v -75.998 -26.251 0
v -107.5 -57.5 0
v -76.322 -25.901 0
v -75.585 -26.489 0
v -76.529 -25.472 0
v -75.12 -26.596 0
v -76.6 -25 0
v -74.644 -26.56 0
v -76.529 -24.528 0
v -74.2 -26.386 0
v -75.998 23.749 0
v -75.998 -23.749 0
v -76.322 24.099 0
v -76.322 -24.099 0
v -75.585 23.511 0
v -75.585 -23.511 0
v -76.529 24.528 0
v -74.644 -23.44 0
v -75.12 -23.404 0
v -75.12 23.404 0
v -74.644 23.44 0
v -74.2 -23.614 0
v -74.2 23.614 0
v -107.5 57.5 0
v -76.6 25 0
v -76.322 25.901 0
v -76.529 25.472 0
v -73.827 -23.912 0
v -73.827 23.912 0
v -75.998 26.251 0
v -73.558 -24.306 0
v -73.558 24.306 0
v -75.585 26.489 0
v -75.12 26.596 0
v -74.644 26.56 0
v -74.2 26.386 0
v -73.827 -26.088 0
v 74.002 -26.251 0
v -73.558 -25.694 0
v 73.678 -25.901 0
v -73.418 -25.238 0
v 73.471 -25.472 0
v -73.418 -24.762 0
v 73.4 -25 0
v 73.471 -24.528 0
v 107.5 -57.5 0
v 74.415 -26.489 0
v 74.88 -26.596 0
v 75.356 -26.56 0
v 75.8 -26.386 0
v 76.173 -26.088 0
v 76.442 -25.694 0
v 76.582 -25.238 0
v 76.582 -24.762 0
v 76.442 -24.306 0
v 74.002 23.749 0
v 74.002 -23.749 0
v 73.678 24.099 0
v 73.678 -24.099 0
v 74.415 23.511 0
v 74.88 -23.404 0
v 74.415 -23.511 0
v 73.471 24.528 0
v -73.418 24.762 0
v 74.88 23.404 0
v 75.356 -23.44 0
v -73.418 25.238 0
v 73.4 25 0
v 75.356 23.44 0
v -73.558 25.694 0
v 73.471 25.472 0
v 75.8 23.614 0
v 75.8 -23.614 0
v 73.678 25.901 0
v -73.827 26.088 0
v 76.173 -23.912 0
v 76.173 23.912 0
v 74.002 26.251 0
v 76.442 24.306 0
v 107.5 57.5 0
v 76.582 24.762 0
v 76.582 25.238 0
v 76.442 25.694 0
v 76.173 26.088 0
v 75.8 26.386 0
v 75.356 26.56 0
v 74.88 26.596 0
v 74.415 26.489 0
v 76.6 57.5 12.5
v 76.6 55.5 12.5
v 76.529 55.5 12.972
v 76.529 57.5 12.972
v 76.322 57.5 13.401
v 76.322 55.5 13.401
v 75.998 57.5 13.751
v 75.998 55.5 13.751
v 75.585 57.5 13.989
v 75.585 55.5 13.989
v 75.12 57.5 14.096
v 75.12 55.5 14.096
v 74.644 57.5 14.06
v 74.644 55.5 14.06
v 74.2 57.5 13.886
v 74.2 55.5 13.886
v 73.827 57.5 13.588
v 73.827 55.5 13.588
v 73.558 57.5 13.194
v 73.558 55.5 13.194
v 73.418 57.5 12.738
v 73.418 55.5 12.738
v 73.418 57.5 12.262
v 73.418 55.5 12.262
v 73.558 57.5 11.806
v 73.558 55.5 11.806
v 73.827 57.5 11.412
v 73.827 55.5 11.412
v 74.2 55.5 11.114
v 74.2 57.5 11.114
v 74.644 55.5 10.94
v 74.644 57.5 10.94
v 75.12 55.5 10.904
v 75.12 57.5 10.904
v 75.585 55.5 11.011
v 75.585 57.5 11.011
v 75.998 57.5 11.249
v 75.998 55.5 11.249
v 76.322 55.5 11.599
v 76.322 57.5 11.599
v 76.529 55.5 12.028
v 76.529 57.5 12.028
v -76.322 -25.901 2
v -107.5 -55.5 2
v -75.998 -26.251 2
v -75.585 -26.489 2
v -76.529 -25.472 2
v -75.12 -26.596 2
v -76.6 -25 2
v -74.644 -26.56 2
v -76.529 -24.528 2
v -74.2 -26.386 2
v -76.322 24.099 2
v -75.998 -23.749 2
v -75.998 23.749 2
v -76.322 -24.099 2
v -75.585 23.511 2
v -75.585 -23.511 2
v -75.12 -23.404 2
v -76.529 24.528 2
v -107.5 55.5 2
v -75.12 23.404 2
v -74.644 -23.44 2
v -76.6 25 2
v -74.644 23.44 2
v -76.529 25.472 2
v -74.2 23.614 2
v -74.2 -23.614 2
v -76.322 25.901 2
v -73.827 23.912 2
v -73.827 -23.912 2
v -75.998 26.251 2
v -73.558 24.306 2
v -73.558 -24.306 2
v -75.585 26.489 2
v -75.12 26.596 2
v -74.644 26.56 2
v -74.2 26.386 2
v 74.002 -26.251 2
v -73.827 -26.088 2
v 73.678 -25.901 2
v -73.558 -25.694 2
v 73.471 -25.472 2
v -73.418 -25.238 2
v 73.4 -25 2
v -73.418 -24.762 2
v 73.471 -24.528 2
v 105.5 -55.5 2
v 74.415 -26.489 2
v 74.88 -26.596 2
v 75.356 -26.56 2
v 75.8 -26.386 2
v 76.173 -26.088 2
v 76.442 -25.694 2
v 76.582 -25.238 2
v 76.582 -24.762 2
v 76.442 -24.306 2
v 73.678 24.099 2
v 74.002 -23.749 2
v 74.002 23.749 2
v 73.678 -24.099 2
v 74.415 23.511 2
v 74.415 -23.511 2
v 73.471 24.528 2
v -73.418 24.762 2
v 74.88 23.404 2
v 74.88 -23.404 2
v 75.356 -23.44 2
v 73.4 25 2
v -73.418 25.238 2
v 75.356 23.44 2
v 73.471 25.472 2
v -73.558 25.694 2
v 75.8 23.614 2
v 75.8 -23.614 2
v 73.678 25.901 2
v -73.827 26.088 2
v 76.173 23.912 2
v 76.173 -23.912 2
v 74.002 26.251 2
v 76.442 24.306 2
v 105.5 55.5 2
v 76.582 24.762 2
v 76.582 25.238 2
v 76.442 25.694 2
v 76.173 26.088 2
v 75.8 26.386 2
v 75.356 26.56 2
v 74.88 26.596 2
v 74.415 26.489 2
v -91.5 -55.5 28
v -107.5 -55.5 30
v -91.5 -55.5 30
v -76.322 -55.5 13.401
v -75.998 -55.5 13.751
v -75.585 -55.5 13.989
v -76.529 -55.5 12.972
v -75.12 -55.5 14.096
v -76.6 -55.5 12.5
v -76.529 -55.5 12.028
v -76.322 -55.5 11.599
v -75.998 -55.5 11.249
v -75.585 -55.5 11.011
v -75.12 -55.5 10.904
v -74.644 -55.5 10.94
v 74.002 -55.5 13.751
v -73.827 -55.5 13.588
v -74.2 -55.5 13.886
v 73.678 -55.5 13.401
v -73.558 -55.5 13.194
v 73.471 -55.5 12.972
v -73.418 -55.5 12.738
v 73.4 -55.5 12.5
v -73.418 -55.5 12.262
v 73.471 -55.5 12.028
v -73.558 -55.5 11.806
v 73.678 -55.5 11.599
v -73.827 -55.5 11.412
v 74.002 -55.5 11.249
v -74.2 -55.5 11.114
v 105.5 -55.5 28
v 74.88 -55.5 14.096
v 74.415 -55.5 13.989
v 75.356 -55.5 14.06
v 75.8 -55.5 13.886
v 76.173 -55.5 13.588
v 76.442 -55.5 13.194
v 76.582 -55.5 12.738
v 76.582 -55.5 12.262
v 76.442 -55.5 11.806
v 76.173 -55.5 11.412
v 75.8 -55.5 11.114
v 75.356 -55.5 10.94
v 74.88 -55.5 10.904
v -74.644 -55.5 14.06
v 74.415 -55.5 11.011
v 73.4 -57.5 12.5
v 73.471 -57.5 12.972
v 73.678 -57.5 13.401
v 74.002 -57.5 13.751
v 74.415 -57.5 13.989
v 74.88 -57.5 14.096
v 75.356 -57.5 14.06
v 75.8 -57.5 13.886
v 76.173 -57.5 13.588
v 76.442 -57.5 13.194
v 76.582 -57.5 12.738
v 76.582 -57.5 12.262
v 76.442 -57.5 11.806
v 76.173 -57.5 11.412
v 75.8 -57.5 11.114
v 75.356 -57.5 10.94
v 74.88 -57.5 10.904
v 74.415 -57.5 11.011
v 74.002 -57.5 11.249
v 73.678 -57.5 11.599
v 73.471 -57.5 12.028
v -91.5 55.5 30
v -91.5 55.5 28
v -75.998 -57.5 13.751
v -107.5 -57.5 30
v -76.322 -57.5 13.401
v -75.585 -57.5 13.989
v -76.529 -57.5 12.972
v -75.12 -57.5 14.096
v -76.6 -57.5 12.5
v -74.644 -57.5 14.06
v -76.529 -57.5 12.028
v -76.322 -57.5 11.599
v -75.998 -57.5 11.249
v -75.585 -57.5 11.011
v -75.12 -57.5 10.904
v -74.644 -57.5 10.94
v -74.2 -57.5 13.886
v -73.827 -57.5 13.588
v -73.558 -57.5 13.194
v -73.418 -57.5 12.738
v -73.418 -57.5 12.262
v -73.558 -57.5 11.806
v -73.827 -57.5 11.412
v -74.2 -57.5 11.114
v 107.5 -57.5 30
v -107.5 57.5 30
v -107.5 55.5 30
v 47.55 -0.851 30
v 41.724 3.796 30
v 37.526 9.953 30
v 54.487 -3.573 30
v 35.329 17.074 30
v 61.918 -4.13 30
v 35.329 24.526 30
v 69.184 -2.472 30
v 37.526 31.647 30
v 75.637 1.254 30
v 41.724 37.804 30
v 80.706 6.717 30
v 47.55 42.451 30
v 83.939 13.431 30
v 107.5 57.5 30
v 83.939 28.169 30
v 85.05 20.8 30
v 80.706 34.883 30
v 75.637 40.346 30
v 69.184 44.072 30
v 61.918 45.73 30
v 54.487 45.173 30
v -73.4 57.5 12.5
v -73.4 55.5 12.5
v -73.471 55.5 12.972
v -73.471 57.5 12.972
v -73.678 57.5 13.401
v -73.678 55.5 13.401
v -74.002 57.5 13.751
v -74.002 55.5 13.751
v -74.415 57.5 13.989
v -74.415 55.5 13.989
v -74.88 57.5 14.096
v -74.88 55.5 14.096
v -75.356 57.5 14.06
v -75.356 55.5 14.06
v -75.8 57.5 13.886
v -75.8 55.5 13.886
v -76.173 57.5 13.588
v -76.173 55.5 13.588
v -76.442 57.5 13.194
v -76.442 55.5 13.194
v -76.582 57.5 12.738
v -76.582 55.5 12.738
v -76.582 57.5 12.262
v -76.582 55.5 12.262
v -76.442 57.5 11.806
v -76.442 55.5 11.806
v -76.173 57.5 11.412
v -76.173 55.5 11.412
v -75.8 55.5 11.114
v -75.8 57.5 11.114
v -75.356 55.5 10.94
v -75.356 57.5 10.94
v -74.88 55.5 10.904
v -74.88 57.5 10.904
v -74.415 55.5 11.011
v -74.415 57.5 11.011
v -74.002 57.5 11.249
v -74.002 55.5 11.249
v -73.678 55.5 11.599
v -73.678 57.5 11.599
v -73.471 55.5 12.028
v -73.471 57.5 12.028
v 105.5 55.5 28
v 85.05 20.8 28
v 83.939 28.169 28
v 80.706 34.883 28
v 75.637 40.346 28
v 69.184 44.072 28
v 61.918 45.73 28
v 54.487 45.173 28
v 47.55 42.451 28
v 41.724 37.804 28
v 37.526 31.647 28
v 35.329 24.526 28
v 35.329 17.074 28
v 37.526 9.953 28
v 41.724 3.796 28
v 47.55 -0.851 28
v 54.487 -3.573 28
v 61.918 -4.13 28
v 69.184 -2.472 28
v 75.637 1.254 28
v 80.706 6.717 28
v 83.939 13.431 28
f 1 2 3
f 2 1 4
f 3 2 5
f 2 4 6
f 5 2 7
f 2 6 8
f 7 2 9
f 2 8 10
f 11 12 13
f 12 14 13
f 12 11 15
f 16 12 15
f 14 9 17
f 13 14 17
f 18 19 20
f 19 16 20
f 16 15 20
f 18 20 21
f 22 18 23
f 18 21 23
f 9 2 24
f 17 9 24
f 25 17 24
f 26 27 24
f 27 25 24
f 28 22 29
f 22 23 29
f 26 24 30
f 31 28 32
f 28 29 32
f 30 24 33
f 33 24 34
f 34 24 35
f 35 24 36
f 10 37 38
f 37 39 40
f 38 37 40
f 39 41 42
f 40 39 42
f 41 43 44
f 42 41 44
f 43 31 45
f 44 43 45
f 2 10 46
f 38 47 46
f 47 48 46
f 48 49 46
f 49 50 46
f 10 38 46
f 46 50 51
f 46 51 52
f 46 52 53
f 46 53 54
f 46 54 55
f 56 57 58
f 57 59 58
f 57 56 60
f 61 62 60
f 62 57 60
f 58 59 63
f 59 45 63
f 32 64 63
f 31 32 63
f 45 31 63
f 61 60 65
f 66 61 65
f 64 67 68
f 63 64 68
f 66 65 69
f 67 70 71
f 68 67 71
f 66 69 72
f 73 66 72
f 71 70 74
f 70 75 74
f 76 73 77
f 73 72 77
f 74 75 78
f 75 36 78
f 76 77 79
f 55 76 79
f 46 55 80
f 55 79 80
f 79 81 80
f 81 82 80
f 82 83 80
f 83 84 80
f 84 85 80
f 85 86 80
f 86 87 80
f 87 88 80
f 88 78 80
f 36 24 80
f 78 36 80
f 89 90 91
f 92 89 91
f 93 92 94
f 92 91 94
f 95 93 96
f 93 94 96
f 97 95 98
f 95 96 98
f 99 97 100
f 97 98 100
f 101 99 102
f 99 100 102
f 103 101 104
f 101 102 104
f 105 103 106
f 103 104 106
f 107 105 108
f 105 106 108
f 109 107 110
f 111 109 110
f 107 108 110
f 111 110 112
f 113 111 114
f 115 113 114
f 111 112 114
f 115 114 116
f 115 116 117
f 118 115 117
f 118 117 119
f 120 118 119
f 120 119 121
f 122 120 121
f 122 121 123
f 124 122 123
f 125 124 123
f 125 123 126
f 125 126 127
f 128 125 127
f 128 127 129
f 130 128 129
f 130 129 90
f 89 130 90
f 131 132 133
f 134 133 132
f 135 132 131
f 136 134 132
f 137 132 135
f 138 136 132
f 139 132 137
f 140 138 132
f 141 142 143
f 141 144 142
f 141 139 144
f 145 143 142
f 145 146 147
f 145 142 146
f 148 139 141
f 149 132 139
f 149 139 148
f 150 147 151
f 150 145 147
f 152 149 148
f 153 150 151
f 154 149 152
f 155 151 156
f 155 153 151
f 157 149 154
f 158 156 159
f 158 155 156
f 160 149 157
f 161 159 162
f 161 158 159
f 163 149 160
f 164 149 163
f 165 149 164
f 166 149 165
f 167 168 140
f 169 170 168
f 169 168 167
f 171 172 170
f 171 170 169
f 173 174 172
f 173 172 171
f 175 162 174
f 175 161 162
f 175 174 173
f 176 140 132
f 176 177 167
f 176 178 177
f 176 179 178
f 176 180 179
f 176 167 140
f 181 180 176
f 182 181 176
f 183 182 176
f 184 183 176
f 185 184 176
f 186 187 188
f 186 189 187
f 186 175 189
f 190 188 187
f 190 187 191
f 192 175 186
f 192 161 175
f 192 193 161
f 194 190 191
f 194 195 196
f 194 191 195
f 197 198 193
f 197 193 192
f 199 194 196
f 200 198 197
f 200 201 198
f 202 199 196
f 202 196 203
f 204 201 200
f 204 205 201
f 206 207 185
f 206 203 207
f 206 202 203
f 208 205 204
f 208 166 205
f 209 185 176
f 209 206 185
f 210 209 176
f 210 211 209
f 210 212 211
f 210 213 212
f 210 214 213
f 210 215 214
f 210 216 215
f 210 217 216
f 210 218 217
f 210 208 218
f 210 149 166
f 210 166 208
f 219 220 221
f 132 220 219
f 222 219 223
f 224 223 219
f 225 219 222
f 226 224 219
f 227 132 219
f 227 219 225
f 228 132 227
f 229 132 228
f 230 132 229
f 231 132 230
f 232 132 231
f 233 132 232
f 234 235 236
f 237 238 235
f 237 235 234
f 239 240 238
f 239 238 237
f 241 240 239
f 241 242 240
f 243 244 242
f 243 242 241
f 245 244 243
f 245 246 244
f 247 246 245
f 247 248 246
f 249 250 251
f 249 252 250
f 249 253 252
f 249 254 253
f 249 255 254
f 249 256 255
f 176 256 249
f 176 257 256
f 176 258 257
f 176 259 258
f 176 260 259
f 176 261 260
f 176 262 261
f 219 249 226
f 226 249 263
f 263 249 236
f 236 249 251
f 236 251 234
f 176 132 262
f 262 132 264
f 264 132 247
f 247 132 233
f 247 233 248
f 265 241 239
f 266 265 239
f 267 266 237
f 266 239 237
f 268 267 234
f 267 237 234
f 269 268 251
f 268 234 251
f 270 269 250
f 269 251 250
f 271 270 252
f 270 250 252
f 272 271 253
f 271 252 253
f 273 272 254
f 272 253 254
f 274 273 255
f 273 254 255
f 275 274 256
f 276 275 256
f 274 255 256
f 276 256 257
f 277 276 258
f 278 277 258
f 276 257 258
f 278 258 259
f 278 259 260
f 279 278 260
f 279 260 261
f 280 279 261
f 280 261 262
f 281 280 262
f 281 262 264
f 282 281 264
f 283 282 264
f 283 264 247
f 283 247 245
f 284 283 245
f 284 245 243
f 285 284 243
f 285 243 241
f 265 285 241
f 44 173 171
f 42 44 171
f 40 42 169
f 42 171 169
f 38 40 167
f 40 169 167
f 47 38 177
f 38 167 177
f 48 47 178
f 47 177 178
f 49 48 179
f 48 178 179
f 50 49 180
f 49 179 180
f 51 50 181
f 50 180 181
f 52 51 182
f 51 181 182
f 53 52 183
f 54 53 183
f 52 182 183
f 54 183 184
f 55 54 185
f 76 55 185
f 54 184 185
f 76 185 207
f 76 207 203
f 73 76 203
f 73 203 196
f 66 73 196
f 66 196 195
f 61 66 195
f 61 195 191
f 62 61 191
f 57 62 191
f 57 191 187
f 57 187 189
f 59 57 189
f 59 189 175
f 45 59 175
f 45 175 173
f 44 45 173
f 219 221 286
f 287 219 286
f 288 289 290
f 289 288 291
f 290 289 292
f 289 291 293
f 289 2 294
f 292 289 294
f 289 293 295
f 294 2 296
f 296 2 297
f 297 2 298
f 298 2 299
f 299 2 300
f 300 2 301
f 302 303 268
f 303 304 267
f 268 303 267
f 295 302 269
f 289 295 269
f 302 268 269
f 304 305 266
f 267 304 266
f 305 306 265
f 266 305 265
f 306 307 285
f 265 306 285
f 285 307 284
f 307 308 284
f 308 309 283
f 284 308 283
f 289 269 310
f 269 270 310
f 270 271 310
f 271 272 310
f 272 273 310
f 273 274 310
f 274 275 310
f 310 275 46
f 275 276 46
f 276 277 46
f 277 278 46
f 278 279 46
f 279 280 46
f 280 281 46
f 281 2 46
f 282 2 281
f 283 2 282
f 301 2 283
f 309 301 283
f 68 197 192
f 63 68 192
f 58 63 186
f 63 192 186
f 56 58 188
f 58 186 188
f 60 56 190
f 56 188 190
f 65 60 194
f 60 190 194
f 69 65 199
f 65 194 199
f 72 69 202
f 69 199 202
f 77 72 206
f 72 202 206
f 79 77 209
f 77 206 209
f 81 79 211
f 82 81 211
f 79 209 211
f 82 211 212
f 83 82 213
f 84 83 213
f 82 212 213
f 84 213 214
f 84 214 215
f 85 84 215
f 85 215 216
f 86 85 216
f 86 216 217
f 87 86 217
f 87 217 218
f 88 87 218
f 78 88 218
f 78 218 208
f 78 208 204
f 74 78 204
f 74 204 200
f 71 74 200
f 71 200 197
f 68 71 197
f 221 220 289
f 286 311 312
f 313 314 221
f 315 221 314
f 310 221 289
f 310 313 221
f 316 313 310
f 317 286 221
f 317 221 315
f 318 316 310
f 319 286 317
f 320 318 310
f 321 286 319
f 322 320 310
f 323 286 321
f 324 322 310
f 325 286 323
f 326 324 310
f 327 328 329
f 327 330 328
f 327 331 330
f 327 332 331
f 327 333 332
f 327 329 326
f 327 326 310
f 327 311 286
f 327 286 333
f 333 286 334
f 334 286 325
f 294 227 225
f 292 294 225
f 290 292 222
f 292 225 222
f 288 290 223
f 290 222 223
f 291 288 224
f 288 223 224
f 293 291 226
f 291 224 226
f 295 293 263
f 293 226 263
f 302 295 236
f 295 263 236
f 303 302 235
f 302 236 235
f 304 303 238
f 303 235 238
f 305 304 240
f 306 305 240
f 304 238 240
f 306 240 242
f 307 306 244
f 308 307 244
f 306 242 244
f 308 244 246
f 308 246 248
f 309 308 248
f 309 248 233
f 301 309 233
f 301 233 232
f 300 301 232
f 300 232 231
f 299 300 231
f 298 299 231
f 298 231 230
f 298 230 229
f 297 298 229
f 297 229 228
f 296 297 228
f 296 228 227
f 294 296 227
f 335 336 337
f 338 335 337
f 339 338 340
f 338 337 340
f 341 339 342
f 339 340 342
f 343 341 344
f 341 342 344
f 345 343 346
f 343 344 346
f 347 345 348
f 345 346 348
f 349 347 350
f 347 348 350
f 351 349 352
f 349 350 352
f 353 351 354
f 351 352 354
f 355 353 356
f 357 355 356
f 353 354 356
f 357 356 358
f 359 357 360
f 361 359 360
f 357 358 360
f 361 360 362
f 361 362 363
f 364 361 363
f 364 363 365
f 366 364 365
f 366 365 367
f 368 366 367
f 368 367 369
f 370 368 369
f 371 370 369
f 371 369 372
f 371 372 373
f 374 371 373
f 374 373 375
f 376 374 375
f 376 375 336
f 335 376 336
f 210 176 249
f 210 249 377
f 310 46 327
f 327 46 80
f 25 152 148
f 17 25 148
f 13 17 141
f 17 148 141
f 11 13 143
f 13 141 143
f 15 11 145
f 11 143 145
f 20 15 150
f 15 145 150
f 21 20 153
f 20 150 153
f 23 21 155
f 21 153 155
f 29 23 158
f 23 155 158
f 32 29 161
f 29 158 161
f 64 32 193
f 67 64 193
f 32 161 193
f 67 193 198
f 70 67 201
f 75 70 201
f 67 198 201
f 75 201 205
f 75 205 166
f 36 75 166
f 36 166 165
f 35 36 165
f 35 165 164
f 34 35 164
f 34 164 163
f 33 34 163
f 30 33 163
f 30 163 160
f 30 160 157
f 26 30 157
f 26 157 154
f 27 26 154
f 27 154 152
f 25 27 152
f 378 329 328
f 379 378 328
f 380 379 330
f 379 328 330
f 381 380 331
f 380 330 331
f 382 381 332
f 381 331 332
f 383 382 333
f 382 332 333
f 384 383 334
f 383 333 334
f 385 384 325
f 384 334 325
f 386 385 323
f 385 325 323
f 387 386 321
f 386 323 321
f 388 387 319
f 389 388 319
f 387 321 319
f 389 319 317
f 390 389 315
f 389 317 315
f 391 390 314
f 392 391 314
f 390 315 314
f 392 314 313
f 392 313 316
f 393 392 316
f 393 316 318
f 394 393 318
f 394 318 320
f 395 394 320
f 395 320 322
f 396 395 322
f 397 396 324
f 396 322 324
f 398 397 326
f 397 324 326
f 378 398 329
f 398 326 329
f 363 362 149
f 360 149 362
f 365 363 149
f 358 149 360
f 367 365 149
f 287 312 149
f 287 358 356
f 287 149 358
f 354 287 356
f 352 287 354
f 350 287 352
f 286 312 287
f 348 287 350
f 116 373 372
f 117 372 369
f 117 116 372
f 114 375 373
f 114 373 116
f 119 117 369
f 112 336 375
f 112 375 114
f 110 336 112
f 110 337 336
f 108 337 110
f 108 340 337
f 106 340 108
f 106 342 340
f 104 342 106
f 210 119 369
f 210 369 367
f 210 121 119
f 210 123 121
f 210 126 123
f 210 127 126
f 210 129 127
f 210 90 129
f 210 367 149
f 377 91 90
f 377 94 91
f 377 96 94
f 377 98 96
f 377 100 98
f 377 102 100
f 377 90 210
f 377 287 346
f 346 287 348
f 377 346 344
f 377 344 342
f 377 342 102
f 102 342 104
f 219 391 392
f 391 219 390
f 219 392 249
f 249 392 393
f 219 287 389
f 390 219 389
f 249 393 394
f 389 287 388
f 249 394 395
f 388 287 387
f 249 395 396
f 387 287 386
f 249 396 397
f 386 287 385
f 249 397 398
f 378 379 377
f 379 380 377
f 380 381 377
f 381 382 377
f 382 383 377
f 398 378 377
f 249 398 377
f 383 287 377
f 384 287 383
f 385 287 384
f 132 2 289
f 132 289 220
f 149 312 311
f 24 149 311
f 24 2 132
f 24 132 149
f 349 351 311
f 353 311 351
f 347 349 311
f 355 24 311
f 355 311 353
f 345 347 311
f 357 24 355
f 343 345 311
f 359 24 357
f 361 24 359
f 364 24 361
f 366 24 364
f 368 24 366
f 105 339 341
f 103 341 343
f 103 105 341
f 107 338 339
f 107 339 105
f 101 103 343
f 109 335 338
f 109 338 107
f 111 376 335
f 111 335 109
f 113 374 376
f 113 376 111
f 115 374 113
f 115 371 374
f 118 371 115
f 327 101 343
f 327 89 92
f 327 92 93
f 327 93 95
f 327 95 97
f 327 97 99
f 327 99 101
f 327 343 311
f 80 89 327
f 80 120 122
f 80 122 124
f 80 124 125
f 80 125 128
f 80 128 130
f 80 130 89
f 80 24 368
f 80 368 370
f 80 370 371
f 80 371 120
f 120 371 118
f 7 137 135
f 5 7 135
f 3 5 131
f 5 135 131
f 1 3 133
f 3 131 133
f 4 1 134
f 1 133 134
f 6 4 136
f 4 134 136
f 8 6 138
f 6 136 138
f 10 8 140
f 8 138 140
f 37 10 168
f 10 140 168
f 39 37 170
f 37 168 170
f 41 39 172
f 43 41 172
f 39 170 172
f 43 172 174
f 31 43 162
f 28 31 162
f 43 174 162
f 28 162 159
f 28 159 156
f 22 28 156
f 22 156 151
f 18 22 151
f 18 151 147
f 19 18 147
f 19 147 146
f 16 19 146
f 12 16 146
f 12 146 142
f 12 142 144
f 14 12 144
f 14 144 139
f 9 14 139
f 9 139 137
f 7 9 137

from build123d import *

# Parameters (mm, degrees)
F0_W           = 215
F0_H           = 115
F1_DEPTH       = 30
F3_T           = -2
F4_W           = 16
F4_H           = 111
F2_R           = 25
F5_DEPTH       = 2
F9_D           = 3.2
F9_DEPTH       = 5
F9_TIP         = 0.9613769904
F9_ON_F7_D     = 3.2
F9_ON_F7_DEPTH = 5
F9_ON_F7_TIP   = 0.9613769904
F9_ON_F8_D     = 3.2
F9_ON_F8_DEPTH = 5
F9_ON_F8_TIP   = 0.9613769904


with BuildPart() as f1:
    # F0 (on Top) → F1 (new body)
    with BuildSketch(Plane.XY):
        Rectangle(F0_W, F0_H)
    extrude(amount=F1_DEPTH)

    # F3
    f3_openings = [f1.faces().sort_by_distance(p)[0] for p in [
        (-107.5, 0, 15),
    ]]
    offset(amount=F3_T, openings=f3_openings)

    # F4 (on face) + F2 (on face) → F5 (cut, through all)
    with BuildSketch(Plane.XY.offset(30)):
        with Locations((-99.5, 0)):
            Rectangle(F4_W, F4_H)
    with BuildSketch(Plane.XY.offset(30)):
        with Locations((60.05, 20.8)):
            Circle(F2_R)
    extrude(amount=-F5_DEPTH, mode=Mode.SUBTRACT)

    # F9
    with Locations(Plane(origin=(0, 0, 0), x_dir=(1, 0, 0), z_dir=(0, 0, -1))):
        with Locations((-75, 25), (75, -25), (-75, -25), (75, 25)):
            Hole(F9_D / 2, depth=F9_DEPTH)
            with Locations((0, 0, -(F9_DEPTH + F9_TIP / 2))):  # 118° drill point
                Cone(0, F9_D / 2, F9_TIP, mode=Mode.SUBTRACT)

    # F9 on F7
    with Locations(Plane.XZ.offset(57.5)):
        with Locations((-75, 12.5), (75, 12.5)):
            Hole(F9_ON_F7_D / 2, depth=F9_ON_F7_DEPTH)
            with Locations((0, 0, -(F9_ON_F7_DEPTH + F9_ON_F7_TIP / 2))):  # 118° drill point
                Cone(0, F9_ON_F7_D / 2, F9_ON_F7_TIP, mode=Mode.SUBTRACT)

    # F9 on F8
    with Locations(Plane(origin=(0, 57.5, 0), x_dir=(-1, 0, 0), z_dir=(0, 1, 0))):
        with Locations((-75, 12.5), (75, 12.5)):
            Hole(F9_ON_F8_D / 2, depth=F9_ON_F8_DEPTH)
            with Locations((0, 0, -(F9_ON_F8_DEPTH + F9_ON_F8_TIP / 2))):  # 118° drill point
                Cone(0, F9_ON_F8_D / 2, F9_ON_F8_TIP, mode=Mode.SUBTRACT)


solid = f1.part
